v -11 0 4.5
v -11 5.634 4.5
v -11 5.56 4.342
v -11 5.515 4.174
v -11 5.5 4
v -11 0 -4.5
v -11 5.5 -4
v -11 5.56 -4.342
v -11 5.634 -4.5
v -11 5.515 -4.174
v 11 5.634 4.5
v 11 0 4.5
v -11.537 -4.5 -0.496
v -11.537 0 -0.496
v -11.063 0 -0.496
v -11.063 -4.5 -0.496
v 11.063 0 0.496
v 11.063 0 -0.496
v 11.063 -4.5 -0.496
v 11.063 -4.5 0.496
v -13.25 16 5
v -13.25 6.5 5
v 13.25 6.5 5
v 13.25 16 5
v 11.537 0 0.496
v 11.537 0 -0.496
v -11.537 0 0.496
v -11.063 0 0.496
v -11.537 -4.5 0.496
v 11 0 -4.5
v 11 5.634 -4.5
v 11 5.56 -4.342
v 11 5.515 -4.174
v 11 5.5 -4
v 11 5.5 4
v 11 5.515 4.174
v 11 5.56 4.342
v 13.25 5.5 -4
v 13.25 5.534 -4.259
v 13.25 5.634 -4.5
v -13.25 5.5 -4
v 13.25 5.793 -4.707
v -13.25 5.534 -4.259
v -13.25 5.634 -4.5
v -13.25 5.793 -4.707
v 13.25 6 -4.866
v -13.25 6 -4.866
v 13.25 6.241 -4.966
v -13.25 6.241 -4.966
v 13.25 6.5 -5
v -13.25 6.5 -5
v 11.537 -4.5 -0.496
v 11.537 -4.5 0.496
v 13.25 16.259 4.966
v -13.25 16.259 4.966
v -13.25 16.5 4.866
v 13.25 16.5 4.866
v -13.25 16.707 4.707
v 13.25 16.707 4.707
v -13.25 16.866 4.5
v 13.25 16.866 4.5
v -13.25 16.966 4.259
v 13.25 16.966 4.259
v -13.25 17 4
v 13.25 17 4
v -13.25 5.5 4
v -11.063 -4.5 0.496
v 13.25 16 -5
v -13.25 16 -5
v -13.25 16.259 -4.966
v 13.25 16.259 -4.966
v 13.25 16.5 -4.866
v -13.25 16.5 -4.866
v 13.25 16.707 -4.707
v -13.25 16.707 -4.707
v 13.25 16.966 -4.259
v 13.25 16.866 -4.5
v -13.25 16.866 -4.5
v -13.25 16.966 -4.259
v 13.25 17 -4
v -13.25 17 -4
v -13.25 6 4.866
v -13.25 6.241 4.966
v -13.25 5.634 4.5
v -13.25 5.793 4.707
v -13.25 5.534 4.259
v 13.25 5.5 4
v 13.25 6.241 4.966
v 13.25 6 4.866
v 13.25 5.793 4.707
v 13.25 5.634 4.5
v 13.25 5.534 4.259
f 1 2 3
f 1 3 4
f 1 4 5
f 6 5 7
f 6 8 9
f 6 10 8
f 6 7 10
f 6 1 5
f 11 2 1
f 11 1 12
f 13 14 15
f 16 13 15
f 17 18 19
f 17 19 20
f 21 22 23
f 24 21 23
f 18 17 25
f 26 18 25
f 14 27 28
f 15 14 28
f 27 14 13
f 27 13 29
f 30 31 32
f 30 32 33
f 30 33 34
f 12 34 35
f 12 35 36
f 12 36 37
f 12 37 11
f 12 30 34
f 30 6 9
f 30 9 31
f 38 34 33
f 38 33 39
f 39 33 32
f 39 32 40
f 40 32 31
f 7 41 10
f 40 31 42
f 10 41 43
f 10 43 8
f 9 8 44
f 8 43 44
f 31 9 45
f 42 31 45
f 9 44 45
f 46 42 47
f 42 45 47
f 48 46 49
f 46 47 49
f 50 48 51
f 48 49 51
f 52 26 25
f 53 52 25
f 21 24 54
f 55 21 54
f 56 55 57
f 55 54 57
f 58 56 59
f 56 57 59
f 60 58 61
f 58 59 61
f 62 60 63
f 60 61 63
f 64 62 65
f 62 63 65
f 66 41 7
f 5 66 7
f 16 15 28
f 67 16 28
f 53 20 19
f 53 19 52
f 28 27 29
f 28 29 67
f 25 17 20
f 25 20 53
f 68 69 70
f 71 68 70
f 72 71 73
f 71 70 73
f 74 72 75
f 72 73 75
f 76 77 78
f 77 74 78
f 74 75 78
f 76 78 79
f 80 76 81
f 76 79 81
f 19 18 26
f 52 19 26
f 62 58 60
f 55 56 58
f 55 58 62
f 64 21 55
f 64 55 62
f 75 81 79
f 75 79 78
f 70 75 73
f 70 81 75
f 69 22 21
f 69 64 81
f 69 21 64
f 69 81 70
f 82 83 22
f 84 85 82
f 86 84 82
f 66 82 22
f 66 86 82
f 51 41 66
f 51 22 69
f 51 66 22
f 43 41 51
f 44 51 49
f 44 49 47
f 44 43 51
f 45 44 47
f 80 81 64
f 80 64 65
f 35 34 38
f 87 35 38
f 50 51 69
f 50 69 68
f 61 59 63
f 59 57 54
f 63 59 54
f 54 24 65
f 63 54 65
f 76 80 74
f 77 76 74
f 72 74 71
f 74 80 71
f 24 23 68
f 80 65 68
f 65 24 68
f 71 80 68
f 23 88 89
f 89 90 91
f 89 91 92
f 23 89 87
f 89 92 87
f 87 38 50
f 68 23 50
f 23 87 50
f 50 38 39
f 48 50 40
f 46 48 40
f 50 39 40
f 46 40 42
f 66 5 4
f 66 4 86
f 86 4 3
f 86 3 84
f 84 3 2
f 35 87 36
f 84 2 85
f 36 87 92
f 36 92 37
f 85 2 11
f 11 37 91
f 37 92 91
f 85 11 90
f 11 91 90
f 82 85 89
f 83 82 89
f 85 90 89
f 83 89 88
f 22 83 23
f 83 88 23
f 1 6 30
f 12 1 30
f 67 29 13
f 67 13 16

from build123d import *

# Parameters (mm, degrees)
SKETCH_1_W        = 22
SKETCH_1_H        = 9
EXTRUDE_1_DEPTH   = 5.5
SKETCH_2_W        = 26.5
SKETCH_2_H        = 10
EXTRUDE_2_DEPTH   = 11.5
SKETCH_3_W        = 0.473160644
SKETCH_3_H        = 0.99156312
EXTRUDE_3_DEPTH   = 4.5
EXTRUDE_3_2_DEPTH = 4.5
FILLET_1_R        = 1


with BuildPart() as part:
    # 草图1 → 凸台-拉伸1 (new body)
    with BuildSketch(Plane(origin=(0, 0, 0), x_dir=(1, 0, 0), z_dir=(0, 1, 0))):
        Rectangle(SKETCH_1_W, SKETCH_1_H)
    extrude(amount=EXTRUDE_1_DEPTH)

    # 草图2 → 凸台-拉伸2 (add)
    with BuildSketch(Plane(origin=(0, 5.5, 0), x_dir=(1, 0, 0), z_dir=(0, 1, 0))):
        Rectangle(SKETCH_2_W, SKETCH_2_H)
    extrude(amount=EXTRUDE_2_DEPTH)

    # 圆角1
    # the kernel refuses this fillet: 1 mm, written as the material it takes off along each edge
    with BuildSketch(Plane(origin=(15.75, 5.5, 5), x_dir=(0, 0, -1), z_dir=(-1, 0, 0))) as fillet_1_piece_1_section:
        with BuildLine():
            CenterArc((FILLET_1_R, -FILLET_1_R), FILLET_1_R, 90, 90)
            Line((0, -FILLET_1_R), (0, 0))
            Line((0, 0), (FILLET_1_R, 0))
        make_face()
    fillet_1_piece_1 = extrude(amount=31.5, mode=Mode.PRIVATE)
    fillet_1_piece_1 = split(fillet_1_piece_1, bisect_by=Plane(origin=(11, 5.524008382, 4.336749215), z_dir=(1, 0, 0)), keep=Keep.TOP, mode=Mode.PRIVATE)
    fillet_1_piece_1 = split(fillet_1_piece_1, bisect_by=Plane(origin=(13.375, 5.524008382, 4.5), z_dir=(0, 0, -1)), keep=Keep.TOP, mode=Mode.PRIVATE)
    add(fillet_1_piece_1, mode=Mode.SUBTRACT)
    with BuildSketch(Plane(origin=(15.75, 5.5, 5), x_dir=(0, 0, -1), z_dir=(-1, 0, 0))) as fillet_1_piece_2_section:
        with BuildLine():
            CenterArc((FILLET_1_R, -FILLET_1_R), FILLET_1_R, 90, 90)
            Line((0, -FILLET_1_R), (0, 0))
            Line((0, 0), (FILLET_1_R, 0))
        make_face()
    fillet_1_piece_2 = extrude(amount=31.5, mode=Mode.PRIVATE)
    fillet_1_piece_2 = split(fillet_1_piece_2, bisect_by=Plane(origin=(11, 5.75512006, 4.835608236), z_dir=(1, 0, 0)), keep=Keep.TOP, mode=Mode.PRIVATE)
    fillet_1_piece_2 = split(fillet_1_piece_2, bisect_by=Plane(origin=(13.375, 5.75512006, 4.5), z_dir=(0, 0, 1)), keep=Keep.TOP, mode=Mode.PRIVATE)
    add(fillet_1_piece_2, mode=Mode.SUBTRACT)
    with BuildSketch(Plane(origin=(15.75, 5.5, 5), x_dir=(0, 0, -1), z_dir=(-1, 0, 0))) as fillet_1_piece_3_section:
        with BuildLine():
            CenterArc((FILLET_1_R, -FILLET_1_R), FILLET_1_R, 90, 90)
            Line((0, -FILLET_1_R), (0, 0))
            Line((0, 0), (FILLET_1_R, 0))
        make_face()
    fillet_1_piece_3 = extrude(amount=31.5, mode=Mode.PRIVATE)
    fillet_1_piece_3 = split(fillet_1_piece_3, bisect_by=Plane(origin=(11, 5.75512006, 4.835608236), z_dir=(-1, 0, 0)), keep=Keep.TOP, mode=Mode.PRIVATE)
    fillet_1_piece_3 = split(fillet_1_piece_3, bisect_by=Plane(origin=(0, 5.75512006, 4.5), z_dir=(0, 0, 1)), keep=Keep.TOP, mode=Mode.PRIVATE)
    fillet_1_piece_3 = split(fillet_1_piece_3, bisect_by=Plane(origin=(-11, 5.75512006, 4.835608236), z_dir=(1, 0, 0)), keep=Keep.TOP, mode=Mode.PRIVATE)
    add(fillet_1_piece_3, mode=Mode.SUBTRACT)
    with BuildSketch(Plane(origin=(15.75, 5.5, 5), x_dir=(0, 0, -1), z_dir=(-1, 0, 0))) as fillet_1_piece_4_section:
        with BuildLine():
            CenterArc((FILLET_1_R, -FILLET_1_R), FILLET_1_R, 90, 90)
            Line((0, -FILLET_1_R), (0, 0))
            Line((0, 0), (FILLET_1_R, 0))
        make_face()
    fillet_1_piece_4 = extrude(amount=31.5, mode=Mode.PRIVATE)
    fillet_1_piece_4 = split(fillet_1_piece_4, bisect_by=Plane(origin=(-13.375, 5.524008382, 4.5), z_dir=(0, 0, -1)), keep=Keep.TOP, mode=Mode.PRIVATE)
    fillet_1_piece_4 = split(fillet_1_piece_4, bisect_by=Plane(origin=(-11, 5.524008382, 4.336749215), z_dir=(-1, 0, 0)), keep=Keep.TOP, mode=Mode.PRIVATE)
    add(fillet_1_piece_4, mode=Mode.SUBTRACT)
    with BuildSketch(Plane(origin=(15.75, 5.5, 5), x_dir=(0, 0, -1), z_dir=(-1, 0, 0))) as fillet_1_piece_5_section:
        with BuildLine():
            CenterArc((FILLET_1_R, -FILLET_1_R), FILLET_1_R, 90, 90)
            Line((0, -FILLET_1_R), (0, 0))
            Line((0, 0), (FILLET_1_R, 0))
        make_face()
    fillet_1_piece_5 = extrude(amount=31.5, mode=Mode.PRIVATE)
    fillet_1_piece_5 = split(fillet_1_piece_5, bisect_by=Plane(origin=(-13.375, 5.75512006, 4.5), z_dir=(0, 0, 1)), keep=Keep.TOP, mode=Mode.PRIVATE)
    fillet_1_piece_5 = split(fillet_1_piece_5, bisect_by=Plane(origin=(-11, 5.75512006, 4.835608236), z_dir=(-1, 0, 0)), keep=Keep.TOP, mode=Mode.PRIVATE)
    add(fillet_1_piece_5, mode=Mode.SUBTRACT)
    with BuildSketch(Plane(origin=(-15.75, 5.5, -5), x_dir=(0, 1, 0), z_dir=(1, 0, 0))) as fillet_1_piece_6_section:
        with BuildLine():
            CenterArc((FILLET_1_R, FILLET_1_R), FILLET_1_R, 180, 90)
            Line((0, FILLET_1_R), (0, 0))
            Line((0, 0), (FILLET_1_R, 0))
        make_face()
    fillet_1_piece_6 = extrude(amount=31.5, mode=Mode.PRIVATE)
    fillet_1_piece_6 = split(fillet_1_piece_6, bisect_by=Plane(origin=(-13.375, 5.75512006, -4.5), z_dir=(0, 0, -1)), keep=Keep.TOP, mode=Mode.PRIVATE)
    fillet_1_piece_6 = split(fillet_1_piece_6, bisect_by=Plane(origin=(-11, 5.75512006, -4.835608236), z_dir=(-1, 0, 0)), keep=Keep.TOP, mode=Mode.PRIVATE)
    add(fillet_1_piece_6, mode=Mode.SUBTRACT)
    with BuildSketch(Plane(origin=(-15.75, 5.5, -5), x_dir=(0, 1, 0), z_dir=(1, 0, 0))) as fillet_1_piece_7_section:
        with BuildLine():
            CenterArc((FILLET_1_R, FILLET_1_R), FILLET_1_R, 180, 90)
            Line((0, FILLET_1_R), (0, 0))
            Line((0, 0), (FILLET_1_R, 0))
        make_face()
    fillet_1_piece_7 = extrude(amount=31.5, mode=Mode.PRIVATE)
    fillet_1_piece_7 = split(fillet_1_piece_7, bisect_by=Plane(origin=(-13.375, 5.524008382, -4.5), z_dir=(0, 0, 1)), keep=Keep.TOP, mode=Mode.PRIVATE)
    fillet_1_piece_7 = split(fillet_1_piece_7, bisect_by=Plane(origin=(-11, 5.524008382, -4.336749215), z_dir=(-1, 0, 0)), keep=Keep.TOP, mode=Mode.PRIVATE)
    add(fillet_1_piece_7, mode=Mode.SUBTRACT)
    with BuildSketch(Plane(origin=(-15.75, 5.5, -5), x_dir=(0, 1, 0), z_dir=(1, 0, 0))) as fillet_1_piece_8_section:
        with BuildLine():
            CenterArc((FILLET_1_R, FILLET_1_R), FILLET_1_R, 180, 90)
            Line((0, FILLET_1_R), (0, 0))
            Line((0, 0), (FILLET_1_R, 0))
        make_face()
    fillet_1_piece_8 = extrude(amount=31.5, mode=Mode.PRIVATE)
    fillet_1_piece_8 = split(fillet_1_piece_8, bisect_by=Plane(origin=(0, 5.75512006, -4.5), z_dir=(0, 0, -1)), keep=Keep.TOP, mode=Mode.PRIVATE)
    fillet_1_piece_8 = split(fillet_1_piece_8, bisect_by=Plane(origin=(11, 5.75512006, -4.835608236), z_dir=(-1, 0, 0)), keep=Keep.TOP, mode=Mode.PRIVATE)
    fillet_1_piece_8 = split(fillet_1_piece_8, bisect_by=Plane(origin=(-11, 5.75512006, -4.835608236), z_dir=(1, 0, 0)), keep=Keep.TOP, mode=Mode.PRIVATE)
    add(fillet_1_piece_8, mode=Mode.SUBTRACT)
    with BuildSketch(Plane(origin=(-15.75, 5.5, -5), x_dir=(0, 1, 0), z_dir=(1, 0, 0))) as fillet_1_piece_9_section:
        with BuildLine():
            CenterArc((FILLET_1_R, FILLET_1_R), FILLET_1_R, 180, 90)
            Line((0, FILLET_1_R), (0, 0))
            Line((0, 0), (FILLET_1_R, 0))
        make_face()
    fillet_1_piece_9 = extrude(amount=31.5, mode=Mode.PRIVATE)
    fillet_1_piece_9 = split(fillet_1_piece_9, bisect_by=Plane(origin=(13.375, 5.75512006, -4.5), z_dir=(0, 0, -1)), keep=Keep.TOP, mode=Mode.PRIVATE)
    fillet_1_piece_9 = split(fillet_1_piece_9, bisect_by=Plane(origin=(11, 5.75512006, -4.835608236), z_dir=(1, 0, 0)), keep=Keep.TOP, mode=Mode.PRIVATE)
    add(fillet_1_piece_9, mode=Mode.SUBTRACT)
    with BuildSketch(Plane(origin=(-15.75, 5.5, -5), x_dir=(0, 1, 0), z_dir=(1, 0, 0))) as fillet_1_piece_10_section:
        with BuildLine():
            CenterArc((FILLET_1_R, FILLET_1_R), FILLET_1_R, 180, 90)
            Line((0, FILLET_1_R), (0, 0))
            Line((0, 0), (FILLET_1_R, 0))
        make_face()
    fillet_1_piece_10 = extrude(amount=31.5, mode=Mode.PRIVATE)
    fillet_1_piece_10 = split(fillet_1_piece_10, bisect_by=Plane(origin=(13.375, 5.524008382, -4.5), z_dir=(0, 0, 1)), keep=Keep.TOP, mode=Mode.PRIVATE)
    fillet_1_piece_10 = split(fillet_1_piece_10, bisect_by=Plane(origin=(11, 5.524008382, -4.336749215), z_dir=(1, 0, 0)), keep=Keep.TOP, mode=Mode.PRIVATE)
    add(fillet_1_piece_10, mode=Mode.SUBTRACT)
    with BuildSketch(Plane(origin=(-15.75, 17, -5), x_dir=(0, -1, 0), z_dir=(1, 0, 0))) as fillet_1_piece_11:
        with BuildLine():
            CenterArc((FILLET_1_R, -FILLET_1_R), FILLET_1_R, 90, 90)
            Line((0, -FILLET_1_R), (0, 0))
            Line((0, 0), (FILLET_1_R, 0))
        make_face()
    extrude(amount=31.5, mode=Mode.SUBTRACT)
    with BuildSketch(Plane(origin=(15.75, 17, 5), x_dir=(0, 0, -1), z_dir=(-1, 0, 0))) as fillet_1_piece_12:
        with BuildLine():
            CenterArc((FILLET_1_R, FILLET_1_R), FILLET_1_R, 180, 90)
            Line((0, FILLET_1_R), (0, 0))
            Line((0, 0), (FILLET_1_R, 0))
        make_face()
    extrude(amount=31.5, mode=Mode.SUBTRACT)


with BuildPart() as body_2:
    # 草图3 → 凸台-拉伸3 (new body)
    with BuildSketch(Plane.XZ):
        with Locations((-11.3, 0)):
            Rectangle(SKETCH_3_W, SKETCH_3_H)
    extrude(amount=EXTRUDE_3_DEPTH)


with BuildPart() as body_3:
    # 草图3 → Extrude 3 2 (new body)
    with BuildSketch(Plane.XZ):
        with Locations((11.3, 0)):
            Rectangle(SKETCH_3_W, SKETCH_3_H)
    extrude(amount=EXTRUDE_3_2_DEPTH)


solid = Compound([part.part, body_2.part, body_3.part])
